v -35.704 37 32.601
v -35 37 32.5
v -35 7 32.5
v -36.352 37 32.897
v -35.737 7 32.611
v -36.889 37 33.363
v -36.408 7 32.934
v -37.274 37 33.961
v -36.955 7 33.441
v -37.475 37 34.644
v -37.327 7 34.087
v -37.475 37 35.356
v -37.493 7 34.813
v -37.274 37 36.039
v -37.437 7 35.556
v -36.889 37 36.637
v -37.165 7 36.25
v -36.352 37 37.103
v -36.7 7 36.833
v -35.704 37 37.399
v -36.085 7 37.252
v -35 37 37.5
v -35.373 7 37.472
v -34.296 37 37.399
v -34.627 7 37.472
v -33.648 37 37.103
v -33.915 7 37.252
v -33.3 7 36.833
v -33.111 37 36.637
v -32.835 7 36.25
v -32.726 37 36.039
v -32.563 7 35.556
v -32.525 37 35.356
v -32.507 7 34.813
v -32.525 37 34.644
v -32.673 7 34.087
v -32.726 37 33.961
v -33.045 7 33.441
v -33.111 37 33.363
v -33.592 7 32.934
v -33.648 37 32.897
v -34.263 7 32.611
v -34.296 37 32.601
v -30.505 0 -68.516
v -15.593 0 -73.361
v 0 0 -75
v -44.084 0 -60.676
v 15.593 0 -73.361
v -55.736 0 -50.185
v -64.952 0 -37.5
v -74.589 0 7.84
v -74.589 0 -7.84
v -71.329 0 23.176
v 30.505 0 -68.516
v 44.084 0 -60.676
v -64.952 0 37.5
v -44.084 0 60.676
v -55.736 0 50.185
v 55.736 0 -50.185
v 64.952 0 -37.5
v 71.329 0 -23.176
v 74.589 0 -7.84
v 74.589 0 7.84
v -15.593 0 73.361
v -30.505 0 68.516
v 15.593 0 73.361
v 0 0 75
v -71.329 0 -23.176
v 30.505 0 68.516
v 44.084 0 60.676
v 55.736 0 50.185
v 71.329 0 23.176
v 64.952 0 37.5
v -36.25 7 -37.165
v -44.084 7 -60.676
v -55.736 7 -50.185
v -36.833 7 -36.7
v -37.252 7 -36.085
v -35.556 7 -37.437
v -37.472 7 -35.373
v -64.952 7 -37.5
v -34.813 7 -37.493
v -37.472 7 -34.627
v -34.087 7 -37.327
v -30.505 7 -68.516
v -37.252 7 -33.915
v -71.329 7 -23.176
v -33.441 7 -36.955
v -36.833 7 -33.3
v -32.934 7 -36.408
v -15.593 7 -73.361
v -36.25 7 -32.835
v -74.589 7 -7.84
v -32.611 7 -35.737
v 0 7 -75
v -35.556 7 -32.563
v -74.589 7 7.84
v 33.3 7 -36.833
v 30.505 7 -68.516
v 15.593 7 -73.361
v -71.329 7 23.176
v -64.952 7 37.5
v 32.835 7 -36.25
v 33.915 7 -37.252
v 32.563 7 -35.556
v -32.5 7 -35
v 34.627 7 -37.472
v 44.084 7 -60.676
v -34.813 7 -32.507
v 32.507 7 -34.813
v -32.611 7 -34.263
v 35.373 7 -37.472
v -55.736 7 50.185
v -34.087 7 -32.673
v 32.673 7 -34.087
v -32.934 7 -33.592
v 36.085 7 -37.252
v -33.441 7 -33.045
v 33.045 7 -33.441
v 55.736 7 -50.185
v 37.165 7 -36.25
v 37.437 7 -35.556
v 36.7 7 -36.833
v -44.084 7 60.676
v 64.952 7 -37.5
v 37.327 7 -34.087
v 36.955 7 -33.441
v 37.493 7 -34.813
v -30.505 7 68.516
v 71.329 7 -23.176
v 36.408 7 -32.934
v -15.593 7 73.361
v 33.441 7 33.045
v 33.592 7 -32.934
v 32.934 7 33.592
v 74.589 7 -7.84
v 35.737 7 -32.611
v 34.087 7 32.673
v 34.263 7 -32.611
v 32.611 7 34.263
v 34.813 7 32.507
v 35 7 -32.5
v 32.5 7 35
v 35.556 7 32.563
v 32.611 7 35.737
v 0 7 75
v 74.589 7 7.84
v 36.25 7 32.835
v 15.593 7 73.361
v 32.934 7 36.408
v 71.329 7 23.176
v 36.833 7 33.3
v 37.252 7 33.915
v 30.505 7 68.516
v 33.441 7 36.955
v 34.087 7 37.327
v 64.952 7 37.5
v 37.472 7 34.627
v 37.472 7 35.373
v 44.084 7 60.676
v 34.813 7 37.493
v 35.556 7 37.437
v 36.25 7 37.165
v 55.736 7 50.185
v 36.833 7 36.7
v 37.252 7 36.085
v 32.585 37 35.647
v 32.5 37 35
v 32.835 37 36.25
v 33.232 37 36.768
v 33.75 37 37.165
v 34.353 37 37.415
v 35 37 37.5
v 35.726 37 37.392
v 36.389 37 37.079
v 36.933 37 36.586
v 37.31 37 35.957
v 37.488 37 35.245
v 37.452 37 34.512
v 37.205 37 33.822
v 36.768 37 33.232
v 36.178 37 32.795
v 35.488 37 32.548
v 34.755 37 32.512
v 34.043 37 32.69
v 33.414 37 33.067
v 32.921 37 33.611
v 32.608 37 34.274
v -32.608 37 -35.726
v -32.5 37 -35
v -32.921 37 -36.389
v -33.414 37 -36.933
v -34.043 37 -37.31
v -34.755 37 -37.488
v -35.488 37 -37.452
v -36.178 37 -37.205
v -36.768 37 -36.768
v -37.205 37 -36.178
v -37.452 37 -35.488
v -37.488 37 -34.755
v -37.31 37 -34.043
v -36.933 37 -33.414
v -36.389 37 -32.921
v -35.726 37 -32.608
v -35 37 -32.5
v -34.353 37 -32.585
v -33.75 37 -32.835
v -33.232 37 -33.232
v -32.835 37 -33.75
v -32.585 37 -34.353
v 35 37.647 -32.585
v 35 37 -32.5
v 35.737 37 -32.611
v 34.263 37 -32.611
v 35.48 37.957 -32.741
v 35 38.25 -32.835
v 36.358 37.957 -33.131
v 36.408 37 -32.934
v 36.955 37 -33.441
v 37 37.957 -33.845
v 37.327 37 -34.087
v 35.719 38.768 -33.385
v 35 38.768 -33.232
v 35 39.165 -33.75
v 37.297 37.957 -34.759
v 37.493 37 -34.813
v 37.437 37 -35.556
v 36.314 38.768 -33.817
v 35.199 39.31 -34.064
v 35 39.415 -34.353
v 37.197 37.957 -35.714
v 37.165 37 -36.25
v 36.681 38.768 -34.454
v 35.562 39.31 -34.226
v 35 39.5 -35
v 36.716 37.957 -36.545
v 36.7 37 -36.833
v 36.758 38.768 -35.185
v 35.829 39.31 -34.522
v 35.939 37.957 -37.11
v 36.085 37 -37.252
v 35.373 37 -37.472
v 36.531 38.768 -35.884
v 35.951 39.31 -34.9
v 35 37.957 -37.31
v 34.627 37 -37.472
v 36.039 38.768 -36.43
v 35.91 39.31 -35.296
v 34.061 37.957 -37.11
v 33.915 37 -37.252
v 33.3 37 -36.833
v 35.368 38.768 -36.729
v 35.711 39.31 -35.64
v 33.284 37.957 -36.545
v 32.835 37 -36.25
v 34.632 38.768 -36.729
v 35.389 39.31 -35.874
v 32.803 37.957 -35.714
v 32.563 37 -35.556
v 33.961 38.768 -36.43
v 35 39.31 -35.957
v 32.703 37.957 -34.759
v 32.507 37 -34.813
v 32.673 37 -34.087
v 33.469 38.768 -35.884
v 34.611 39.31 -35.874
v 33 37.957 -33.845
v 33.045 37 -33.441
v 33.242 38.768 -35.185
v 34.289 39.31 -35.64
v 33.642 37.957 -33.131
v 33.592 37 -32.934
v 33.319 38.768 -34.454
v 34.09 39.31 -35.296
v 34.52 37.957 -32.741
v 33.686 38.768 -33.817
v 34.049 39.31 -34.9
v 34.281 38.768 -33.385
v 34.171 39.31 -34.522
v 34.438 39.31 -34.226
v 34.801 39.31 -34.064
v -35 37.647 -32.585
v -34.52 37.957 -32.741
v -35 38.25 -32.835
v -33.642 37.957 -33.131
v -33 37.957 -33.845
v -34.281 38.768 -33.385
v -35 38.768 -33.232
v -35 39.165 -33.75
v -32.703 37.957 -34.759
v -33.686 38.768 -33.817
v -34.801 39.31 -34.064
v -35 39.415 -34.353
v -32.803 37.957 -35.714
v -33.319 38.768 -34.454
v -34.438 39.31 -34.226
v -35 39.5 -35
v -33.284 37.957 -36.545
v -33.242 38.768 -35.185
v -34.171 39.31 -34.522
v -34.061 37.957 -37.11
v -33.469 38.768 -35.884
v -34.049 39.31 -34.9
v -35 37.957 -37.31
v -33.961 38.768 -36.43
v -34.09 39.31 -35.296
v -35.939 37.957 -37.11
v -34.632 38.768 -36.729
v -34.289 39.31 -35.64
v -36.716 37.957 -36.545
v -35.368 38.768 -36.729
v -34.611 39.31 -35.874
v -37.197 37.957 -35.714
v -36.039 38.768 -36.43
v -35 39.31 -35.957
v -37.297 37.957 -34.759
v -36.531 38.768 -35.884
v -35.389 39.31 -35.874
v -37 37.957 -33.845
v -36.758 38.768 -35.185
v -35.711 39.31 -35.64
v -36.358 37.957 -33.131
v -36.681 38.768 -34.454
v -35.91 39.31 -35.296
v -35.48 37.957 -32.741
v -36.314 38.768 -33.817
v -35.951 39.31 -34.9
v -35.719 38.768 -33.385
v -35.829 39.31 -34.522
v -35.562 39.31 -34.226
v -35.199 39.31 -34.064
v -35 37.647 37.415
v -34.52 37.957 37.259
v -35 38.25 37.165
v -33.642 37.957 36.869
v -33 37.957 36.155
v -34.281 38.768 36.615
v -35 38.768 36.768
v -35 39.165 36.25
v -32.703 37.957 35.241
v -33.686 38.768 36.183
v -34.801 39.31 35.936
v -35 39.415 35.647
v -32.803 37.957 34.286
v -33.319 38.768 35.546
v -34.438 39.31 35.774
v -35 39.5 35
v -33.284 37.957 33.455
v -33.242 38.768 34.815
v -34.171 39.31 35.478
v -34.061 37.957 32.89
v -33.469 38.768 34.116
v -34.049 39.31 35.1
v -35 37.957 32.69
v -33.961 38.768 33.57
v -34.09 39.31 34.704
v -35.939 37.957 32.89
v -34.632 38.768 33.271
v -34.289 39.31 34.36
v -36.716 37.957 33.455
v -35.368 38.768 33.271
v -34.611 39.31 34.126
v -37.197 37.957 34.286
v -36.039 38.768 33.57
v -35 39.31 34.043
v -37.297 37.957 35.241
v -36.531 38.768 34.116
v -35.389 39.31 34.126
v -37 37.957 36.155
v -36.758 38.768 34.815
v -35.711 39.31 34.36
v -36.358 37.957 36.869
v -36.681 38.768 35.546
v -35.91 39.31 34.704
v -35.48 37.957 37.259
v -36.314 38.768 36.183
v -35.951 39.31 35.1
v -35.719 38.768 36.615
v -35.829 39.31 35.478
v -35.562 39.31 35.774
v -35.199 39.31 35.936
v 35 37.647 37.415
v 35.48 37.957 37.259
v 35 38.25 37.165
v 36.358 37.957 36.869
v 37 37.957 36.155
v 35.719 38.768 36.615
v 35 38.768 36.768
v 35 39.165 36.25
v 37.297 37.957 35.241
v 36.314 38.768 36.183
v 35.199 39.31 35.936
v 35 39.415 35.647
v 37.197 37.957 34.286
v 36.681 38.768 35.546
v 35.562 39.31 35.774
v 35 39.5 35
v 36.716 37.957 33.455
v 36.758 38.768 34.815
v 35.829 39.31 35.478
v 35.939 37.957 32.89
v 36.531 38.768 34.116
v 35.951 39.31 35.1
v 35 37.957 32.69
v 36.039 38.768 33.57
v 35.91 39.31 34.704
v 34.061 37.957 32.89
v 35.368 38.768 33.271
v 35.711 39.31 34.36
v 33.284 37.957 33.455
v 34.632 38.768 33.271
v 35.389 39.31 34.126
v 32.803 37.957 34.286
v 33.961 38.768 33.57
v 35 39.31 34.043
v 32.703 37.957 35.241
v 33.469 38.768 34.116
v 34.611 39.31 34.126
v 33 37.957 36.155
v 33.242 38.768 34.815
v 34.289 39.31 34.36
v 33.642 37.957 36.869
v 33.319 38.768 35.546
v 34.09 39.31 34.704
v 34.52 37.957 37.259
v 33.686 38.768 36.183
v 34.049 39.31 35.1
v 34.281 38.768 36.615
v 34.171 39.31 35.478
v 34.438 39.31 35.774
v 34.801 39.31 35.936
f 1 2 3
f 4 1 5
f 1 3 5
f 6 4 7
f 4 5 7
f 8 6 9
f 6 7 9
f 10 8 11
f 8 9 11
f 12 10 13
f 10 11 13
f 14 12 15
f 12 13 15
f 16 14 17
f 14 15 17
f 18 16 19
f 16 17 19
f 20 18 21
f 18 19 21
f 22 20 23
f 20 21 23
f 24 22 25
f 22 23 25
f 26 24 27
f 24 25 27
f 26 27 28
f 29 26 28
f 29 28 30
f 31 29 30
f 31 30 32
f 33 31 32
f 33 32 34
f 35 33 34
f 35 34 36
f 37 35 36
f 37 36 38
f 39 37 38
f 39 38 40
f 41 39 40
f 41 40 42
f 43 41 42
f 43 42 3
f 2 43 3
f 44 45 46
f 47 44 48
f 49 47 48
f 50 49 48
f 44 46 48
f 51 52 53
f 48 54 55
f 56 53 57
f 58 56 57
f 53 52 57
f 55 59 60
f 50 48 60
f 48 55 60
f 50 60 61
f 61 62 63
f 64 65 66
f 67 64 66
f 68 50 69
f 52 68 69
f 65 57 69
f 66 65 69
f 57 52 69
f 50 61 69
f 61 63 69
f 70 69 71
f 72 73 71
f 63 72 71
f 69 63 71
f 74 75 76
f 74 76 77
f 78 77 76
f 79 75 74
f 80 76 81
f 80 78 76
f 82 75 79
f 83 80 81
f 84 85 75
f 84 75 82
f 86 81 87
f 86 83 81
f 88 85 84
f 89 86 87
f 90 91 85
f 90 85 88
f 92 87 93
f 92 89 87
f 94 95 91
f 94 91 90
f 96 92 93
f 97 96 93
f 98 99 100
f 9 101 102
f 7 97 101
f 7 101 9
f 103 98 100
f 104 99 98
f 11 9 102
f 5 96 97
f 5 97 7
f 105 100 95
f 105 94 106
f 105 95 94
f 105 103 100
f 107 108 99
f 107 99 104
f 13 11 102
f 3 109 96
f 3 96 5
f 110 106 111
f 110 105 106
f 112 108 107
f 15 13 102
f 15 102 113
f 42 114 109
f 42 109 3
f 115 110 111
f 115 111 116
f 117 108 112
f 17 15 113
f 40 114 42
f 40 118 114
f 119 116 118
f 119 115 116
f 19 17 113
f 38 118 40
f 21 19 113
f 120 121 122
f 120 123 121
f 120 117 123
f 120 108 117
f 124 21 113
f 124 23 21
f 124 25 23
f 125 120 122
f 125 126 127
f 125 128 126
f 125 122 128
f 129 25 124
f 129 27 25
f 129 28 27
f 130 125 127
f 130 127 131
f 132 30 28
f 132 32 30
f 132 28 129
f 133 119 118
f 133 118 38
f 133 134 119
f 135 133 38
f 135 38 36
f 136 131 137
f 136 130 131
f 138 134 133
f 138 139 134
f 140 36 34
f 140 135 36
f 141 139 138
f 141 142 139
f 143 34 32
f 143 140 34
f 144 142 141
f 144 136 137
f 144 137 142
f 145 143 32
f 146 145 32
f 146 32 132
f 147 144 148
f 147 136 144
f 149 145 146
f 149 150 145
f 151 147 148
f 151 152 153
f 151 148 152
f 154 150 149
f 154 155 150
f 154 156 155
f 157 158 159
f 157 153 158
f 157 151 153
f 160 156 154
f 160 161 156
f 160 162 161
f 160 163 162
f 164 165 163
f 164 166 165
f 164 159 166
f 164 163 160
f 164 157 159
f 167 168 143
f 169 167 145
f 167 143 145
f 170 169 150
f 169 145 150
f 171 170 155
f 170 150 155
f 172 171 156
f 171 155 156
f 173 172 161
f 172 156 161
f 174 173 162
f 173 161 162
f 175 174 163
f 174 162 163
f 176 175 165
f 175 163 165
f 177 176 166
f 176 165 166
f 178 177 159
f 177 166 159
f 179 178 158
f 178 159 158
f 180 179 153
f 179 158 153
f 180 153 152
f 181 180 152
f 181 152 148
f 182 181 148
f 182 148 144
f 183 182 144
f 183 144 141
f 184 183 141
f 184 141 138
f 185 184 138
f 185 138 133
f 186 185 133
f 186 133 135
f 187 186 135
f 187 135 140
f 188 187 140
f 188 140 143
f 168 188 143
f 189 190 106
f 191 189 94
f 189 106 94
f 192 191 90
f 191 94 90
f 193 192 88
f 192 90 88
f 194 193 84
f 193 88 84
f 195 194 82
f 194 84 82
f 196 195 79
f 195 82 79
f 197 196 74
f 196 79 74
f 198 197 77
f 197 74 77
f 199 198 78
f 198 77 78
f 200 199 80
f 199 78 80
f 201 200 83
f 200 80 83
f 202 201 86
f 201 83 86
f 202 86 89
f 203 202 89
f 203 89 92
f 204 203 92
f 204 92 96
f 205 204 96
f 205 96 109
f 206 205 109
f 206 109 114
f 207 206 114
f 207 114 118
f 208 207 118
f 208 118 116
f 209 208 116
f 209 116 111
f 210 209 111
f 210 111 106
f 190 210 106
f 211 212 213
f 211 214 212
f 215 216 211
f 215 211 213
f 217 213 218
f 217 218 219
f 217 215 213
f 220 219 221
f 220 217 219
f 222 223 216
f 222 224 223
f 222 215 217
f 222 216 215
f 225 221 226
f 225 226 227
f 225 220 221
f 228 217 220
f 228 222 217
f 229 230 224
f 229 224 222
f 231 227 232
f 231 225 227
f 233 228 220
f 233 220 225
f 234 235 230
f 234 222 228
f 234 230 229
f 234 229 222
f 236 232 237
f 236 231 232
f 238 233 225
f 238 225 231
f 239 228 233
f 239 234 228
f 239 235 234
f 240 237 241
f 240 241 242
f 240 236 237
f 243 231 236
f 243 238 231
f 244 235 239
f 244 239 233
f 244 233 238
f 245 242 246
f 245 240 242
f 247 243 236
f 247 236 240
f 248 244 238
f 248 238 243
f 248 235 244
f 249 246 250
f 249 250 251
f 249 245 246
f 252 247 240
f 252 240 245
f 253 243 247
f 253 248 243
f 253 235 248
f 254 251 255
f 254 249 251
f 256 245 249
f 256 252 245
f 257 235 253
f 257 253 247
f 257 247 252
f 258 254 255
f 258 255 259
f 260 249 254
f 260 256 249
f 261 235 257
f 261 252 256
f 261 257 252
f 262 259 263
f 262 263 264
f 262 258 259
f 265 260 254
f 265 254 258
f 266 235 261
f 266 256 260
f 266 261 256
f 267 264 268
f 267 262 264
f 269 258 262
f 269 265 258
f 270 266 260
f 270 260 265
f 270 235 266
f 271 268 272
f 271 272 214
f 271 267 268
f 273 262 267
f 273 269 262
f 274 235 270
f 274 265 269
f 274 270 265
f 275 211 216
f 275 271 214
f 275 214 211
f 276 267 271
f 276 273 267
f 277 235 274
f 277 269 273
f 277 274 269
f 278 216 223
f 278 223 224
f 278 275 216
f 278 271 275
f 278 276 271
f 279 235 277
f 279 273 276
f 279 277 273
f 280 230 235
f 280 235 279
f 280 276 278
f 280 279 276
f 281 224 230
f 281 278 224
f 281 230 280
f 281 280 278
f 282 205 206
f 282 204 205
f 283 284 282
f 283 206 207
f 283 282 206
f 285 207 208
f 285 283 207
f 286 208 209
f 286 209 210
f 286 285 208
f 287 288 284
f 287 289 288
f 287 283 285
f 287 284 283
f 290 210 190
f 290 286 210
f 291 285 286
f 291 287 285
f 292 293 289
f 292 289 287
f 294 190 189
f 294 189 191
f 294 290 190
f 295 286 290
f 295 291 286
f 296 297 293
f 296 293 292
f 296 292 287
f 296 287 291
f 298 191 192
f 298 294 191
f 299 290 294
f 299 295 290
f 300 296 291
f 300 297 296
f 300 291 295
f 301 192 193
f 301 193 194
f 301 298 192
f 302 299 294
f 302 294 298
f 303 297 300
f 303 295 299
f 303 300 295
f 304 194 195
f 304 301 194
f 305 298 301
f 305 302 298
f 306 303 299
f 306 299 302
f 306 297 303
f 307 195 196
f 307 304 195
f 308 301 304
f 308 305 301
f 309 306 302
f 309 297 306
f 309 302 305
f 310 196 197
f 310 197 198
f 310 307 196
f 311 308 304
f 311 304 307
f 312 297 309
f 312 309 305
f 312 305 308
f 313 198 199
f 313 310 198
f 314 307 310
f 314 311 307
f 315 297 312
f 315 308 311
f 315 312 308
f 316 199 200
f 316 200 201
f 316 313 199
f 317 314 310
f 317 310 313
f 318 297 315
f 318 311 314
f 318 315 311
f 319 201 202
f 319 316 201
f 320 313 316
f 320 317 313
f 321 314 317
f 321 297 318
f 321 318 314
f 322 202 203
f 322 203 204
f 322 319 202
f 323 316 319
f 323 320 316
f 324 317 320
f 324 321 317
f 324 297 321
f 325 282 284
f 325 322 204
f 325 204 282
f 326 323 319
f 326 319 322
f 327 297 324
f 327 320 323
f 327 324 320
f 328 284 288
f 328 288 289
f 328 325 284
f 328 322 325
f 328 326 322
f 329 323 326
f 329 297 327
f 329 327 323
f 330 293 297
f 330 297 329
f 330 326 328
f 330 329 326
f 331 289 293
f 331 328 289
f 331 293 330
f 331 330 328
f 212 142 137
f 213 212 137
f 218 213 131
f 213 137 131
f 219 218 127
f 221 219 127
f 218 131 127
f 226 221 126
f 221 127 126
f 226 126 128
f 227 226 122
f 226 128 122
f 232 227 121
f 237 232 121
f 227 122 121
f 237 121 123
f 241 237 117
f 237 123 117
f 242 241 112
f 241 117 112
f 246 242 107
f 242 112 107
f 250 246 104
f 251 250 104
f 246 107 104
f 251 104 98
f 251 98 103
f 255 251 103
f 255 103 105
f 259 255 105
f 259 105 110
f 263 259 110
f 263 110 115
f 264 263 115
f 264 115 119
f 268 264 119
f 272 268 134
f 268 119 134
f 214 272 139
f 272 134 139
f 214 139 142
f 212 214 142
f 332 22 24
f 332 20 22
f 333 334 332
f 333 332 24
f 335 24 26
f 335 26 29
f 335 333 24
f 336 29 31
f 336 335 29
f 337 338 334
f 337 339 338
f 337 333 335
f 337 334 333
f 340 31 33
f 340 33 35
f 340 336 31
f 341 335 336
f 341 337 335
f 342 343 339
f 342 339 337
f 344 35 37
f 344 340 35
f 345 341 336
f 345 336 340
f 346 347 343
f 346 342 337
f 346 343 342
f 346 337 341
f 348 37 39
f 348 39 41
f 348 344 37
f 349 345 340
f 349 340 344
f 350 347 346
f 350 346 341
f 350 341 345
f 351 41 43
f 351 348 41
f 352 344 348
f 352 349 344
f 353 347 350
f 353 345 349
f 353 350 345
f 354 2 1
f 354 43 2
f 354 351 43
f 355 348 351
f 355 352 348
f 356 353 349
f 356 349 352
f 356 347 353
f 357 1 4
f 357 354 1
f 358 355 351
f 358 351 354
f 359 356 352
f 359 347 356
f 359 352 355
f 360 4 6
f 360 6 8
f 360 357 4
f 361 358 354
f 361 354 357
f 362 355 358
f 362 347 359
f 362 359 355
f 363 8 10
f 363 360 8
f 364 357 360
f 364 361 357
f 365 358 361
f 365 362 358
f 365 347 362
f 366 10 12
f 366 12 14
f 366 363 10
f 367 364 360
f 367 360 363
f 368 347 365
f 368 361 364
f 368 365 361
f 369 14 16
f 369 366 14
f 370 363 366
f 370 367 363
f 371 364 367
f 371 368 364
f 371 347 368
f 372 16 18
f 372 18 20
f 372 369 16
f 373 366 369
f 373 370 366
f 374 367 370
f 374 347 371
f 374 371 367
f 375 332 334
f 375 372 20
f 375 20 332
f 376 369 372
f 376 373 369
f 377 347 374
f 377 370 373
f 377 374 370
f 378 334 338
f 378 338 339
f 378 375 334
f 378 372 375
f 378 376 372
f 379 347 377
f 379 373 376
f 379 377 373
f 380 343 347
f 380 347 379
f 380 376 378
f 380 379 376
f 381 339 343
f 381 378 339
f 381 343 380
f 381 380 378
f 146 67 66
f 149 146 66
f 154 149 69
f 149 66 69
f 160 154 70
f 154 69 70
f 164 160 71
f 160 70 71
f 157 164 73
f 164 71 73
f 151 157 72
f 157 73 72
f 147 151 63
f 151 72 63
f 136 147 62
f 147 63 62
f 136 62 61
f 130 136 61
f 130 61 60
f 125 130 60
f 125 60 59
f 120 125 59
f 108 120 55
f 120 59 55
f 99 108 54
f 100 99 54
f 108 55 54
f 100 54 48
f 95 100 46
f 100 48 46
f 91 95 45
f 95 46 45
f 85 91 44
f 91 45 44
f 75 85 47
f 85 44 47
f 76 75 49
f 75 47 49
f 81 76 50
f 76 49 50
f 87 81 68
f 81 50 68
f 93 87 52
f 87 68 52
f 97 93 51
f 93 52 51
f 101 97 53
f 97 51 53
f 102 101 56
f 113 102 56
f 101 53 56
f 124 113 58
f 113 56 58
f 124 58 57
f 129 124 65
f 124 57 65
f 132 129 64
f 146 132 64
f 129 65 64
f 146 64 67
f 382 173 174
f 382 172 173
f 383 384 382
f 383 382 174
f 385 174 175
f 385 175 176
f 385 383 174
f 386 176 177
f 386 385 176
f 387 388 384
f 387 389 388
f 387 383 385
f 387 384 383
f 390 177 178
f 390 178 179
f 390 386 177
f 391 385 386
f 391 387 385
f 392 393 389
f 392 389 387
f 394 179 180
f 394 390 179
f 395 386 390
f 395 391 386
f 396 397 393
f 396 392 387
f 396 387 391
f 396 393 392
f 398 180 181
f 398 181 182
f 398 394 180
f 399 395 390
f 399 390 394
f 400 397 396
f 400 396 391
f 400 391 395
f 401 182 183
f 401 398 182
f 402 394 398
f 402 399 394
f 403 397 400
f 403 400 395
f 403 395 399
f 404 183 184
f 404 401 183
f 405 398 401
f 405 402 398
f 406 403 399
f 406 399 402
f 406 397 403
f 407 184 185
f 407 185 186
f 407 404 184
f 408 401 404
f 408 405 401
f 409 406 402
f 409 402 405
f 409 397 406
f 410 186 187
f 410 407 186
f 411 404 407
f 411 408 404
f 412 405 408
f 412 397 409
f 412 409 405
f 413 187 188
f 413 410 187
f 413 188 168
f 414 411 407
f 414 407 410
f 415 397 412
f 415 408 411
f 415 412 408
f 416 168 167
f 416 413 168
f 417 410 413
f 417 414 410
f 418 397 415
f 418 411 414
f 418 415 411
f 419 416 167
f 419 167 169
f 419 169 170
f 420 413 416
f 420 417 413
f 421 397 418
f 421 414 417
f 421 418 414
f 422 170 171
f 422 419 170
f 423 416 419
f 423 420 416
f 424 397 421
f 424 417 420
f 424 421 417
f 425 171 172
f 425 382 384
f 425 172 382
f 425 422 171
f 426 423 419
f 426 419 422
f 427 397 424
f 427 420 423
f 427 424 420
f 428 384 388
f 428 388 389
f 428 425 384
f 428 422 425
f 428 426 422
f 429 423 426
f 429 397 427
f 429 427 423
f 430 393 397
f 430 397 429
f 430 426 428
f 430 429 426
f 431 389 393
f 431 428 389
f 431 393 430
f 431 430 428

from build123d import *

# Parameters (mm, degrees)
SKETCH1_R                      = 75
BOSS_EXTRUDE1_DEPTH            = 7
SKETCH2_R                      = 2.5
BOSS_EXTRUDE2_DEPTH            = 30
DOME1_FACE_RADIUS              = 2.5
DOME1_HEIGHT                   = 2.5
CIRPATTERN1_COUNT              = 4
CIRPATTERN1_COPY_1_FACE_RADIUS = 2.5
CIRPATTERN1_COPY_1_HEIGHT      = 2.5
CIRPATTERN1_COPY_2_FACE_RADIUS = 2.5
CIRPATTERN1_COPY_2_HEIGHT      = 2.5
CIRPATTERN1_COPY_3_FACE_RADIUS = 2.5
CIRPATTERN1_COPY_3_HEIGHT      = 2.5


with BuildPart() as part:
    # Sketch1 → Boss-Extrude1 (new body)
    with BuildSketch(Plane(origin=(0, 0, 0), x_dir=(1, 0, 0), z_dir=(0, 1, 0))):
        with Locations(Location((0, 0, 0), (0, 0, 270))):
            Circle(SKETCH1_R)
    extrude(amount=BOSS_EXTRUDE1_DEPTH)

    # Sketch2 → Boss-Extrude2 (add)
    with BuildSketch(Plane(origin=(0, 7, 0), x_dir=(1, 0, 0), z_dir=(0, 1, 0))):
        with Locations(Location((35, 35, 0), (0, 0, 270))):
            Circle(SKETCH2_R)
    boss_extrude2 = extrude(amount=BOSS_EXTRUDE2_DEPTH)

    # Dome1: a dome of height H over a round flat face of radius A is a cap of a sphere of radius (A * A + H * H) / (2 * H)
    dome1_r = (DOME1_FACE_RADIUS * DOME1_FACE_RADIUS + DOME1_HEIGHT * DOME1_HEIGHT) / (2 * DOME1_HEIGHT)
    dome1_base = Plane((35, 37, -35), z_dir=(0, 1, 0))
    with Locations(dome1_base.offset(DOME1_HEIGHT - dome1_r)):
        dome1_ball = Sphere(dome1_r, mode=Mode.PRIVATE)
    add(split(dome1_ball, bisect_by=dome1_base, keep=Keep.TOP, mode=Mode.PRIVATE))

    # CirPattern1: Boss-Extrude2 ×4 about axis
    cirpattern1_axis = Axis((0, 0, 0), (0, 1, 0))
    for i in range(1, CIRPATTERN1_COUNT):
        add(boss_extrude2.rotate(cirpattern1_axis, i * 360 / CIRPATTERN1_COUNT))

    # CirPattern1 copy 1: a dome of height H over a round flat face of radius A is a cap of a sphere of radius (A * A + H * H) / (2 * H)
    cirpattern1_copy_1_r = (CIRPATTERN1_COPY_1_FACE_RADIUS * CIRPATTERN1_COPY_1_FACE_RADIUS + CIRPATTERN1_COPY_1_HEIGHT * CIRPATTERN1_COPY_1_HEIGHT) / (2 * CIRPATTERN1_COPY_1_HEIGHT)
    cirpattern1_copy_1_base = Plane((-35, 37, -35), z_dir=(0, 1, 0))
    with Locations(cirpattern1_copy_1_base.offset(CIRPATTERN1_COPY_1_HEIGHT - cirpattern1_copy_1_r)):
        cirpattern1_copy_1_ball = Sphere(cirpattern1_copy_1_r, mode=Mode.PRIVATE)
    add(split(cirpattern1_copy_1_ball, bisect_by=cirpattern1_copy_1_base, keep=Keep.TOP, mode=Mode.PRIVATE))

    # CirPattern1 copy 2: a dome of height H over a round flat face of radius A is a cap of a sphere of radius (A * A + H * H) / (2 * H)
    cirpattern1_copy_2_r = (CIRPATTERN1_COPY_2_FACE_RADIUS * CIRPATTERN1_COPY_2_FACE_RADIUS + CIRPATTERN1_COPY_2_HEIGHT * CIRPATTERN1_COPY_2_HEIGHT) / (2 * CIRPATTERN1_COPY_2_HEIGHT)
    cirpattern1_copy_2_base = Plane((-35, 37, 35), z_dir=(0, 1, 0))
    with Locations(cirpattern1_copy_2_base.offset(CIRPATTERN1_COPY_2_HEIGHT - cirpattern1_copy_2_r)):
        cirpattern1_copy_2_ball = Sphere(cirpattern1_copy_2_r, mode=Mode.PRIVATE)
    add(split(cirpattern1_copy_2_ball, bisect_by=cirpattern1_copy_2_base, keep=Keep.TOP, mode=Mode.PRIVATE))

    # CirPattern1 copy 3: a dome of height H over a round flat face of radius A is a cap of a sphere of radius (A * A + H * H) / (2 * H)
    cirpattern1_copy_3_r = (CIRPATTERN1_COPY_3_FACE_RADIUS * CIRPATTERN1_COPY_3_FACE_RADIUS + CIRPATTERN1_COPY_3_HEIGHT * CIRPATTERN1_COPY_3_HEIGHT) / (2 * CIRPATTERN1_COPY_3_HEIGHT)
    cirpattern1_copy_3_base = Plane((35, 37, 35), z_dir=(0, 1, 0))
    with Locations(cirpattern1_copy_3_base.offset(CIRPATTERN1_COPY_3_HEIGHT - cirpattern1_copy_3_r)):
        cirpattern1_copy_3_ball = Sphere(cirpattern1_copy_3_r, mode=Mode.PRIVATE)
    add(split(cirpattern1_copy_3_ball, bisect_by=cirpattern1_copy_3_base, keep=Keep.TOP, mode=Mode.PRIVATE))


solid = part.part
